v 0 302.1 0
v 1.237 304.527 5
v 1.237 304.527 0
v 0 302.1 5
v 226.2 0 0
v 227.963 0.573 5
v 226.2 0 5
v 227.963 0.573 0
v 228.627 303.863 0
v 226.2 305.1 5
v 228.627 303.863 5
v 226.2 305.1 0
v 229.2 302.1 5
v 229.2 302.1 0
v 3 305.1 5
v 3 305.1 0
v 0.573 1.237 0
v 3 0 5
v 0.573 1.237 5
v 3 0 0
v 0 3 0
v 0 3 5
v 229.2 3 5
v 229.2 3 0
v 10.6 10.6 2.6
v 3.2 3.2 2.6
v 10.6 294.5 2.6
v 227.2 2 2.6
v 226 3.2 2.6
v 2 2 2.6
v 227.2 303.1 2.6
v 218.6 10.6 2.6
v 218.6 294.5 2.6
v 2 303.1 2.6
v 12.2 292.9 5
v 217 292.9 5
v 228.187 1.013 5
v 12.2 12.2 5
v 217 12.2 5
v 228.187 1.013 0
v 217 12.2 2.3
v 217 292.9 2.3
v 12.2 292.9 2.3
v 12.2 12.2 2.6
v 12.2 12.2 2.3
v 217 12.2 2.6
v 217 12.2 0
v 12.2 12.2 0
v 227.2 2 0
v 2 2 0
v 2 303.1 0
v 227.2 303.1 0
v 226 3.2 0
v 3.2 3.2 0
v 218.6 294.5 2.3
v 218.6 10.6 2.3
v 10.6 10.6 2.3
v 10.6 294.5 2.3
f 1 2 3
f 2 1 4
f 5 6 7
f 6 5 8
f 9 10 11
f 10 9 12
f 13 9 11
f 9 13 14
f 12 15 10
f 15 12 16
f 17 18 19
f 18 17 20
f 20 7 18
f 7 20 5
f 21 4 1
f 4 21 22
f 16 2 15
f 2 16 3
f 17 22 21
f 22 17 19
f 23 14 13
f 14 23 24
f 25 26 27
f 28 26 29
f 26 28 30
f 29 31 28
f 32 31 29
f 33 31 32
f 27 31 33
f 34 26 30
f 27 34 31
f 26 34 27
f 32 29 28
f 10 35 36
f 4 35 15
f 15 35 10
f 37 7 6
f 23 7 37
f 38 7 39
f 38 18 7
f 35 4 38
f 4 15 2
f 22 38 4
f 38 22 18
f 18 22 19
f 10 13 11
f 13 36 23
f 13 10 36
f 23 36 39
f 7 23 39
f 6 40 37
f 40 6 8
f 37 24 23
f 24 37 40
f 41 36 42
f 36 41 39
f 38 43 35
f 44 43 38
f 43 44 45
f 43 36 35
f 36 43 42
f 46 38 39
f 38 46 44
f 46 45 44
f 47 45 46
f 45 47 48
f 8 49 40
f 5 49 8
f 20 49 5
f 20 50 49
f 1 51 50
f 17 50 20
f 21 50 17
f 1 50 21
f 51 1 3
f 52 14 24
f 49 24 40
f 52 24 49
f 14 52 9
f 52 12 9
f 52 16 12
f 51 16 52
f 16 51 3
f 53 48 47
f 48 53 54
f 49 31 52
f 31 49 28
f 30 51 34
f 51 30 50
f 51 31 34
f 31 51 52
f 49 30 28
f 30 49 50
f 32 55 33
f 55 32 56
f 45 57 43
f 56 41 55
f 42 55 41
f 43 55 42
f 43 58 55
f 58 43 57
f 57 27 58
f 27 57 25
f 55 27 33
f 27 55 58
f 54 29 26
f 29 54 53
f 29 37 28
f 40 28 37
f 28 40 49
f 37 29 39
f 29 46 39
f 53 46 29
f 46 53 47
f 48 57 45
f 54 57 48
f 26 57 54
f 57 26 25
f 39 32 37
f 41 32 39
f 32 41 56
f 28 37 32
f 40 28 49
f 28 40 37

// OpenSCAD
// file: bezel_right.scad
// ============================================================
// Front Bezel - Right Side (mitered 45° corners)
// ============================================================
include <common.scad>

module bezel_right() {
    intersection() {
        front_bezel_full();
        miter_region_right();
    }
}

bezel_right();
// file: bezel_left.scad
// ============================================================
// Front Bezel - Left Side (mitered 45° corners)
// ============================================================
include <common.scad>

module bezel_left() {
    intersection() {
        front_bezel_full();
        miter_region_left();
    }
}

bezel_left();
// file: bezel_bottom.scad
// ============================================================
// Front Bezel - Bottom Side (mitered 45° corners)
// Channel narrowed at bottom edge for thin 0.8mm panel rim.
// Side channels remain full width for left/right panel rims.
// ============================================================
include <common.scad>

module bezel_bottom() {
    // Bottom channel: just enough for the thin bottom panel rim
    bottom_channel = bottom_rim + 2 * channel_tol;  // ~1.2mm

    // Fill on the WINDOW side, leaving channel near the OUTER WALL
    // Channel is right behind the outer wall (where panel rim sits)
    // Fill goes from channel end to the window edge
    fill_y_start = outer_wall + bottom_channel;  // after outer wall + channel
    fill_y_end   = win_y;                        // up to window
    fill_depth   = fill_y_end - fill_y_start;

    // Leave outer_wall clear on each X side for side channels
    fill_x_start = outer_wall;
    fill_x_end   = frame_w - outer_wall;

    intersection() {
        union() {
            front_bezel_full();

            // Wall inside the channel to narrow it for the thin bottom rim
            // Only at channel depth (z=0 to frame_d), not bezel body depth
            // This leaves the space above (toward window) open for the display
            if (fill_depth > 0) {
                translate([fill_x_start, fill_y_start, 0])
                    cube([fill_x_end - fill_x_start, fill_depth, frame_d]);
            }
        }
        miter_region_bottom();
    }
}

bezel_bottom();
// file: bezel_top.scad
// ============================================================
// Front Bezel - Top Side (mitered 45° corners)
// ============================================================
include <common.scad>

module bezel_top() {
    intersection() {
        front_bezel_full();
        miter_region_top();
    }
}

bezel_top();
// file: common.scad
// ============================================================
// Photo Frame for 13.3" Spectra 6 E-Ink Display
// Shared parameters and utility modules
// ============================================================

/* [Display Parameters] */
// Active (visible) area
active_w = 202.8;
active_h = 270.4;
// Glass outline dimensions
glass_w = 208.8;
glass_h = 284.7;
display_d = 0.85;
// Non-active border (asymmetric)
border_left   = 3.0;
border_right  = 3.0;
border_top    = 3.0;
border_bottom = 11.3;   // 284.7 - 270.4 - 3 = 11.3, FPC side, large non-active area

/* [Driver Board Parameters] */
board_w = 80;
board_h = 40;
board_d = 1.6;
board_clearance = 10;     // component height clearance

/* [Battery Parameters] */
battery_w = 60;
battery_h = 35;
battery_d = 8;

/* [Frame Parameters] */
bezel_w    = 10;          // bezel width around active area
wall_thick = 2.4;         // front frame thickness
back_thick = 1.2;         // back panel thickness (6 layers @ 0.2mm)
frame_d    = 2.6;         // total frame depth (1.2mm back + 1.4mm cavity)
tol        = 0.2;
corner_r   = 3;

/* [Channel Parameters] */
outer_wall  = 2.0;        // outer wall thickness on bezel
inner_lip_d = 0.3;        // inner lip depth (presses on display)
channel_tol = 0.2;        // clearance for back panel in channel
lip_overlap = 2.0;        // how much bezel overlaps the glass on each side

/* [Printer Limits] */
bed_max = 260;

/* [Stand Parameters] */
stand_angle = 12;         // tilt angle in degrees
stand_foot_depth = 100;   // how far the base extends back

/* [FPC Cable] */
// 60-pin FPC exits from bottom of display, offset 2mm to the right
fpc_w = 134;              // FPC ribbon width
fpc_slot_w = fpc_w + 8;   // slot width with clearance (+4mm wider)
fpc_offset_x = 2;         // shifted 2mm to the right from center
fpc_slot_h = 6;

/* [Buttons - 1 reset + 3 custom] */
button_dia     = 3.5;
button_spacing = 12;
button_count   = 4;

/* [Joint Parameters] */
tongue_depth  = 1.2;      // tongue-and-groove interlock depth
tongue_length = 15;        // each tongue segment length
tongue_count  = 4;         // number of tongue segments along width
screw_r       = 1.5;       // M3 screw radius

// ============================================================
// Derived dimensions
// ============================================================

cavity_w = glass_w + 2 * tol;
cavity_h = glass_h + 2 * tol;

frame_w = cavity_w + 2 * bezel_w;
frame_h = cavity_h + 2 * bezel_w;

// Back panel rim widths (design parameters)
panel_rim  = 8.2;    // rim on left, right, top
bottom_rim = 0.8;    // thin bottom rim (hidden in base)

// Derived panel dimensions
panel_w = cavity_w + 2 * panel_rim;
panel_h = cavity_h + panel_rim + bottom_rim;
panel_inset = (frame_w - panel_w) / 2;  // how far panel is inset from bezel edge

// Inner lip width: derived to fill gap between panel rim and window
// Layout: outer_wall + channel_tol + panel_rim + channel_tol + inner_lip_w = win_x
inner_lip_w = bezel_w + tol + lip_overlap - outer_wall - panel_rim - 2 * channel_tol;

// Back panel split: bottom piece as tall as fits the bed
back_split_y = bed_max - 10;   // 250mm from bottom, top piece ~60mm

// Base dimensions (foot/stand only, attaches to bottom of back panel)
base_wall = wall_thick;
base_total_depth = stand_foot_depth;

// ============================================================
// Utility modules
// ============================================================

module rounded_rect(w, h, d, r) {
    linear_extrude(d)
        offset(r = r)
            offset(r = -r)
                square([w, h]);
}

module rounded_rect_2d(w, h, r) {
    offset(r = r)
        offset(r = -r)
            square([w, h]);
}

// Tongue segments along X axis at a given Y position
module tongue_strip(width, y_pos, z_pos, depth, length, count) {
    spacing = width / (count + 1);
    for (i = [1 : count]) {
        translate([i * spacing - length / 2, y_pos, z_pos])
            cube([length, depth, back_thick]);
    }
}

// ============================================================
// Front bezel - mitered picture frame style (4 sides)
// ============================================================

// Window position and size (derived from glass position + lip overlap)
win_x = bezel_w + tol + lip_overlap;
win_y = bezel_w + tol + lip_overlap;
win_w = glass_w - 2 * lip_overlap;
win_h = glass_h - 2 * lip_overlap;

// Bezel Z layout:
//   z=0                           bottom of outer wall (back of frame)
//   z=frame_d                     bezel body bottom (= back panel top)
//   z=frame_d+wall_thick          bezel front face

module front_bezel_full() {
    union() {
        // 1. Bezel body (visible frame, sits on top of back panel)
        difference() {
            translate([0, 0, frame_d])
                rounded_rect(frame_w, frame_h, wall_thick, corner_r);

            // Window opening - sharp corners (display glass is rectangular)
            translate([win_x, win_y, -0.1])
                cube([win_w, win_h, frame_d + wall_thick + 0.2]);
        }

        // 2. Outer wall (wraps around back panel edge)
        difference() {
            rounded_rect(frame_w, frame_h, frame_d + wall_thick, corner_r);

            // Hollow inside - sharp corners
            translate([outer_wall, outer_wall, -0.1])
                cube([
                    frame_w - 2 * outer_wall,
                    frame_h - 2 * outer_wall,
                    frame_d + wall_thick + 0.2
                ]);
        }

        // 3. Inner lip (presses on display glass)
        difference() {
            translate([win_x - inner_lip_w, win_y - inner_lip_w, frame_d - inner_lip_d])
                cube([win_w + 2 * inner_lip_w, win_h + 2 * inner_lip_w, inner_lip_d]);

            translate([win_x, win_y, frame_d - inner_lip_d - 0.1])
                cube([win_w, win_h, inner_lip_d + 0.2]);
        }
    }
}

// 45-degree miter cutting regions for each side
// Each region is a 2D polygon extruded tall enough to cut the bezel
e = 1; // margin for clean cuts

// Bottom: below both 45° lines from bottom corners
module miter_region_bottom() {
    linear_extrude(50, center = true)
        polygon([[-e, -e], [frame_w + e, -e], [frame_w / 2, frame_w / 2]]);
}

// Top: above both 45° lines from top corners
module miter_region_top() {
    linear_extrude(50, center = true)
        polygon([[-e, frame_h + e], [frame_w + e, frame_h + e],
                 [frame_w / 2, frame_h - frame_w / 2]]);
}

// Left: between 45° lines from both left corners
module miter_region_left() {
    linear_extrude(50, center = true)
        polygon([[-e, -e], [frame_h / 2, frame_h / 2], [-e, frame_h + e]]);
}

// Right: between 45° lines from both right corners
module miter_region_right() {
    linear_extrude(50, center = true)
        polygon([[frame_w + e, -e],
                 [frame_w - frame_h / 2, frame_h / 2],
                 [frame_w + e, frame_h + e]]);
}

// Full back panel (smaller than bezel, fits inside channel)
module back_panel_full() {
    // FPC slot X position: centered + offset to the right
    fpc_x = (panel_w - fpc_slot_w) / 2 + fpc_offset_x;

    difference() {
        rounded_rect(panel_w, panel_h, frame_d, max(corner_r - panel_inset, 0.5));

        // Display cavity
        translate([panel_rim, bottom_rim, back_thick])
            cube([cavity_w, cavity_h, frame_d]);

        // FPC cable exit slot at bottom (offset 2mm to right)
        translate([fpc_x, -0.1, back_thick])
            cube([fpc_slot_w, bottom_rim + 0.1, frame_d - back_thick + 0.1]);

        // FPC ribbon gap: 4mm zone from panel bottom edge
        // Goes through the full back wall so ribbon can fold freely
        fpc_gap = 4;
        translate([fpc_x, 0, -0.1])
            cube([fpc_slot_w, fpc_gap, frame_d + 0.1]);
    }
}
// main file
// ============================================================
// Four bezels assembled together as a complete frame
// ============================================================
include <common.scad>
use <bezel_top.scad>
use <bezel_bottom.scad>
use <bezel_left.scad>
use <bezel_right.scad>

color("Silver") bezel_top();
color("Silver") bezel_bottom();
color("Silver") bezel_left();
color("Silver") bezel_right();
